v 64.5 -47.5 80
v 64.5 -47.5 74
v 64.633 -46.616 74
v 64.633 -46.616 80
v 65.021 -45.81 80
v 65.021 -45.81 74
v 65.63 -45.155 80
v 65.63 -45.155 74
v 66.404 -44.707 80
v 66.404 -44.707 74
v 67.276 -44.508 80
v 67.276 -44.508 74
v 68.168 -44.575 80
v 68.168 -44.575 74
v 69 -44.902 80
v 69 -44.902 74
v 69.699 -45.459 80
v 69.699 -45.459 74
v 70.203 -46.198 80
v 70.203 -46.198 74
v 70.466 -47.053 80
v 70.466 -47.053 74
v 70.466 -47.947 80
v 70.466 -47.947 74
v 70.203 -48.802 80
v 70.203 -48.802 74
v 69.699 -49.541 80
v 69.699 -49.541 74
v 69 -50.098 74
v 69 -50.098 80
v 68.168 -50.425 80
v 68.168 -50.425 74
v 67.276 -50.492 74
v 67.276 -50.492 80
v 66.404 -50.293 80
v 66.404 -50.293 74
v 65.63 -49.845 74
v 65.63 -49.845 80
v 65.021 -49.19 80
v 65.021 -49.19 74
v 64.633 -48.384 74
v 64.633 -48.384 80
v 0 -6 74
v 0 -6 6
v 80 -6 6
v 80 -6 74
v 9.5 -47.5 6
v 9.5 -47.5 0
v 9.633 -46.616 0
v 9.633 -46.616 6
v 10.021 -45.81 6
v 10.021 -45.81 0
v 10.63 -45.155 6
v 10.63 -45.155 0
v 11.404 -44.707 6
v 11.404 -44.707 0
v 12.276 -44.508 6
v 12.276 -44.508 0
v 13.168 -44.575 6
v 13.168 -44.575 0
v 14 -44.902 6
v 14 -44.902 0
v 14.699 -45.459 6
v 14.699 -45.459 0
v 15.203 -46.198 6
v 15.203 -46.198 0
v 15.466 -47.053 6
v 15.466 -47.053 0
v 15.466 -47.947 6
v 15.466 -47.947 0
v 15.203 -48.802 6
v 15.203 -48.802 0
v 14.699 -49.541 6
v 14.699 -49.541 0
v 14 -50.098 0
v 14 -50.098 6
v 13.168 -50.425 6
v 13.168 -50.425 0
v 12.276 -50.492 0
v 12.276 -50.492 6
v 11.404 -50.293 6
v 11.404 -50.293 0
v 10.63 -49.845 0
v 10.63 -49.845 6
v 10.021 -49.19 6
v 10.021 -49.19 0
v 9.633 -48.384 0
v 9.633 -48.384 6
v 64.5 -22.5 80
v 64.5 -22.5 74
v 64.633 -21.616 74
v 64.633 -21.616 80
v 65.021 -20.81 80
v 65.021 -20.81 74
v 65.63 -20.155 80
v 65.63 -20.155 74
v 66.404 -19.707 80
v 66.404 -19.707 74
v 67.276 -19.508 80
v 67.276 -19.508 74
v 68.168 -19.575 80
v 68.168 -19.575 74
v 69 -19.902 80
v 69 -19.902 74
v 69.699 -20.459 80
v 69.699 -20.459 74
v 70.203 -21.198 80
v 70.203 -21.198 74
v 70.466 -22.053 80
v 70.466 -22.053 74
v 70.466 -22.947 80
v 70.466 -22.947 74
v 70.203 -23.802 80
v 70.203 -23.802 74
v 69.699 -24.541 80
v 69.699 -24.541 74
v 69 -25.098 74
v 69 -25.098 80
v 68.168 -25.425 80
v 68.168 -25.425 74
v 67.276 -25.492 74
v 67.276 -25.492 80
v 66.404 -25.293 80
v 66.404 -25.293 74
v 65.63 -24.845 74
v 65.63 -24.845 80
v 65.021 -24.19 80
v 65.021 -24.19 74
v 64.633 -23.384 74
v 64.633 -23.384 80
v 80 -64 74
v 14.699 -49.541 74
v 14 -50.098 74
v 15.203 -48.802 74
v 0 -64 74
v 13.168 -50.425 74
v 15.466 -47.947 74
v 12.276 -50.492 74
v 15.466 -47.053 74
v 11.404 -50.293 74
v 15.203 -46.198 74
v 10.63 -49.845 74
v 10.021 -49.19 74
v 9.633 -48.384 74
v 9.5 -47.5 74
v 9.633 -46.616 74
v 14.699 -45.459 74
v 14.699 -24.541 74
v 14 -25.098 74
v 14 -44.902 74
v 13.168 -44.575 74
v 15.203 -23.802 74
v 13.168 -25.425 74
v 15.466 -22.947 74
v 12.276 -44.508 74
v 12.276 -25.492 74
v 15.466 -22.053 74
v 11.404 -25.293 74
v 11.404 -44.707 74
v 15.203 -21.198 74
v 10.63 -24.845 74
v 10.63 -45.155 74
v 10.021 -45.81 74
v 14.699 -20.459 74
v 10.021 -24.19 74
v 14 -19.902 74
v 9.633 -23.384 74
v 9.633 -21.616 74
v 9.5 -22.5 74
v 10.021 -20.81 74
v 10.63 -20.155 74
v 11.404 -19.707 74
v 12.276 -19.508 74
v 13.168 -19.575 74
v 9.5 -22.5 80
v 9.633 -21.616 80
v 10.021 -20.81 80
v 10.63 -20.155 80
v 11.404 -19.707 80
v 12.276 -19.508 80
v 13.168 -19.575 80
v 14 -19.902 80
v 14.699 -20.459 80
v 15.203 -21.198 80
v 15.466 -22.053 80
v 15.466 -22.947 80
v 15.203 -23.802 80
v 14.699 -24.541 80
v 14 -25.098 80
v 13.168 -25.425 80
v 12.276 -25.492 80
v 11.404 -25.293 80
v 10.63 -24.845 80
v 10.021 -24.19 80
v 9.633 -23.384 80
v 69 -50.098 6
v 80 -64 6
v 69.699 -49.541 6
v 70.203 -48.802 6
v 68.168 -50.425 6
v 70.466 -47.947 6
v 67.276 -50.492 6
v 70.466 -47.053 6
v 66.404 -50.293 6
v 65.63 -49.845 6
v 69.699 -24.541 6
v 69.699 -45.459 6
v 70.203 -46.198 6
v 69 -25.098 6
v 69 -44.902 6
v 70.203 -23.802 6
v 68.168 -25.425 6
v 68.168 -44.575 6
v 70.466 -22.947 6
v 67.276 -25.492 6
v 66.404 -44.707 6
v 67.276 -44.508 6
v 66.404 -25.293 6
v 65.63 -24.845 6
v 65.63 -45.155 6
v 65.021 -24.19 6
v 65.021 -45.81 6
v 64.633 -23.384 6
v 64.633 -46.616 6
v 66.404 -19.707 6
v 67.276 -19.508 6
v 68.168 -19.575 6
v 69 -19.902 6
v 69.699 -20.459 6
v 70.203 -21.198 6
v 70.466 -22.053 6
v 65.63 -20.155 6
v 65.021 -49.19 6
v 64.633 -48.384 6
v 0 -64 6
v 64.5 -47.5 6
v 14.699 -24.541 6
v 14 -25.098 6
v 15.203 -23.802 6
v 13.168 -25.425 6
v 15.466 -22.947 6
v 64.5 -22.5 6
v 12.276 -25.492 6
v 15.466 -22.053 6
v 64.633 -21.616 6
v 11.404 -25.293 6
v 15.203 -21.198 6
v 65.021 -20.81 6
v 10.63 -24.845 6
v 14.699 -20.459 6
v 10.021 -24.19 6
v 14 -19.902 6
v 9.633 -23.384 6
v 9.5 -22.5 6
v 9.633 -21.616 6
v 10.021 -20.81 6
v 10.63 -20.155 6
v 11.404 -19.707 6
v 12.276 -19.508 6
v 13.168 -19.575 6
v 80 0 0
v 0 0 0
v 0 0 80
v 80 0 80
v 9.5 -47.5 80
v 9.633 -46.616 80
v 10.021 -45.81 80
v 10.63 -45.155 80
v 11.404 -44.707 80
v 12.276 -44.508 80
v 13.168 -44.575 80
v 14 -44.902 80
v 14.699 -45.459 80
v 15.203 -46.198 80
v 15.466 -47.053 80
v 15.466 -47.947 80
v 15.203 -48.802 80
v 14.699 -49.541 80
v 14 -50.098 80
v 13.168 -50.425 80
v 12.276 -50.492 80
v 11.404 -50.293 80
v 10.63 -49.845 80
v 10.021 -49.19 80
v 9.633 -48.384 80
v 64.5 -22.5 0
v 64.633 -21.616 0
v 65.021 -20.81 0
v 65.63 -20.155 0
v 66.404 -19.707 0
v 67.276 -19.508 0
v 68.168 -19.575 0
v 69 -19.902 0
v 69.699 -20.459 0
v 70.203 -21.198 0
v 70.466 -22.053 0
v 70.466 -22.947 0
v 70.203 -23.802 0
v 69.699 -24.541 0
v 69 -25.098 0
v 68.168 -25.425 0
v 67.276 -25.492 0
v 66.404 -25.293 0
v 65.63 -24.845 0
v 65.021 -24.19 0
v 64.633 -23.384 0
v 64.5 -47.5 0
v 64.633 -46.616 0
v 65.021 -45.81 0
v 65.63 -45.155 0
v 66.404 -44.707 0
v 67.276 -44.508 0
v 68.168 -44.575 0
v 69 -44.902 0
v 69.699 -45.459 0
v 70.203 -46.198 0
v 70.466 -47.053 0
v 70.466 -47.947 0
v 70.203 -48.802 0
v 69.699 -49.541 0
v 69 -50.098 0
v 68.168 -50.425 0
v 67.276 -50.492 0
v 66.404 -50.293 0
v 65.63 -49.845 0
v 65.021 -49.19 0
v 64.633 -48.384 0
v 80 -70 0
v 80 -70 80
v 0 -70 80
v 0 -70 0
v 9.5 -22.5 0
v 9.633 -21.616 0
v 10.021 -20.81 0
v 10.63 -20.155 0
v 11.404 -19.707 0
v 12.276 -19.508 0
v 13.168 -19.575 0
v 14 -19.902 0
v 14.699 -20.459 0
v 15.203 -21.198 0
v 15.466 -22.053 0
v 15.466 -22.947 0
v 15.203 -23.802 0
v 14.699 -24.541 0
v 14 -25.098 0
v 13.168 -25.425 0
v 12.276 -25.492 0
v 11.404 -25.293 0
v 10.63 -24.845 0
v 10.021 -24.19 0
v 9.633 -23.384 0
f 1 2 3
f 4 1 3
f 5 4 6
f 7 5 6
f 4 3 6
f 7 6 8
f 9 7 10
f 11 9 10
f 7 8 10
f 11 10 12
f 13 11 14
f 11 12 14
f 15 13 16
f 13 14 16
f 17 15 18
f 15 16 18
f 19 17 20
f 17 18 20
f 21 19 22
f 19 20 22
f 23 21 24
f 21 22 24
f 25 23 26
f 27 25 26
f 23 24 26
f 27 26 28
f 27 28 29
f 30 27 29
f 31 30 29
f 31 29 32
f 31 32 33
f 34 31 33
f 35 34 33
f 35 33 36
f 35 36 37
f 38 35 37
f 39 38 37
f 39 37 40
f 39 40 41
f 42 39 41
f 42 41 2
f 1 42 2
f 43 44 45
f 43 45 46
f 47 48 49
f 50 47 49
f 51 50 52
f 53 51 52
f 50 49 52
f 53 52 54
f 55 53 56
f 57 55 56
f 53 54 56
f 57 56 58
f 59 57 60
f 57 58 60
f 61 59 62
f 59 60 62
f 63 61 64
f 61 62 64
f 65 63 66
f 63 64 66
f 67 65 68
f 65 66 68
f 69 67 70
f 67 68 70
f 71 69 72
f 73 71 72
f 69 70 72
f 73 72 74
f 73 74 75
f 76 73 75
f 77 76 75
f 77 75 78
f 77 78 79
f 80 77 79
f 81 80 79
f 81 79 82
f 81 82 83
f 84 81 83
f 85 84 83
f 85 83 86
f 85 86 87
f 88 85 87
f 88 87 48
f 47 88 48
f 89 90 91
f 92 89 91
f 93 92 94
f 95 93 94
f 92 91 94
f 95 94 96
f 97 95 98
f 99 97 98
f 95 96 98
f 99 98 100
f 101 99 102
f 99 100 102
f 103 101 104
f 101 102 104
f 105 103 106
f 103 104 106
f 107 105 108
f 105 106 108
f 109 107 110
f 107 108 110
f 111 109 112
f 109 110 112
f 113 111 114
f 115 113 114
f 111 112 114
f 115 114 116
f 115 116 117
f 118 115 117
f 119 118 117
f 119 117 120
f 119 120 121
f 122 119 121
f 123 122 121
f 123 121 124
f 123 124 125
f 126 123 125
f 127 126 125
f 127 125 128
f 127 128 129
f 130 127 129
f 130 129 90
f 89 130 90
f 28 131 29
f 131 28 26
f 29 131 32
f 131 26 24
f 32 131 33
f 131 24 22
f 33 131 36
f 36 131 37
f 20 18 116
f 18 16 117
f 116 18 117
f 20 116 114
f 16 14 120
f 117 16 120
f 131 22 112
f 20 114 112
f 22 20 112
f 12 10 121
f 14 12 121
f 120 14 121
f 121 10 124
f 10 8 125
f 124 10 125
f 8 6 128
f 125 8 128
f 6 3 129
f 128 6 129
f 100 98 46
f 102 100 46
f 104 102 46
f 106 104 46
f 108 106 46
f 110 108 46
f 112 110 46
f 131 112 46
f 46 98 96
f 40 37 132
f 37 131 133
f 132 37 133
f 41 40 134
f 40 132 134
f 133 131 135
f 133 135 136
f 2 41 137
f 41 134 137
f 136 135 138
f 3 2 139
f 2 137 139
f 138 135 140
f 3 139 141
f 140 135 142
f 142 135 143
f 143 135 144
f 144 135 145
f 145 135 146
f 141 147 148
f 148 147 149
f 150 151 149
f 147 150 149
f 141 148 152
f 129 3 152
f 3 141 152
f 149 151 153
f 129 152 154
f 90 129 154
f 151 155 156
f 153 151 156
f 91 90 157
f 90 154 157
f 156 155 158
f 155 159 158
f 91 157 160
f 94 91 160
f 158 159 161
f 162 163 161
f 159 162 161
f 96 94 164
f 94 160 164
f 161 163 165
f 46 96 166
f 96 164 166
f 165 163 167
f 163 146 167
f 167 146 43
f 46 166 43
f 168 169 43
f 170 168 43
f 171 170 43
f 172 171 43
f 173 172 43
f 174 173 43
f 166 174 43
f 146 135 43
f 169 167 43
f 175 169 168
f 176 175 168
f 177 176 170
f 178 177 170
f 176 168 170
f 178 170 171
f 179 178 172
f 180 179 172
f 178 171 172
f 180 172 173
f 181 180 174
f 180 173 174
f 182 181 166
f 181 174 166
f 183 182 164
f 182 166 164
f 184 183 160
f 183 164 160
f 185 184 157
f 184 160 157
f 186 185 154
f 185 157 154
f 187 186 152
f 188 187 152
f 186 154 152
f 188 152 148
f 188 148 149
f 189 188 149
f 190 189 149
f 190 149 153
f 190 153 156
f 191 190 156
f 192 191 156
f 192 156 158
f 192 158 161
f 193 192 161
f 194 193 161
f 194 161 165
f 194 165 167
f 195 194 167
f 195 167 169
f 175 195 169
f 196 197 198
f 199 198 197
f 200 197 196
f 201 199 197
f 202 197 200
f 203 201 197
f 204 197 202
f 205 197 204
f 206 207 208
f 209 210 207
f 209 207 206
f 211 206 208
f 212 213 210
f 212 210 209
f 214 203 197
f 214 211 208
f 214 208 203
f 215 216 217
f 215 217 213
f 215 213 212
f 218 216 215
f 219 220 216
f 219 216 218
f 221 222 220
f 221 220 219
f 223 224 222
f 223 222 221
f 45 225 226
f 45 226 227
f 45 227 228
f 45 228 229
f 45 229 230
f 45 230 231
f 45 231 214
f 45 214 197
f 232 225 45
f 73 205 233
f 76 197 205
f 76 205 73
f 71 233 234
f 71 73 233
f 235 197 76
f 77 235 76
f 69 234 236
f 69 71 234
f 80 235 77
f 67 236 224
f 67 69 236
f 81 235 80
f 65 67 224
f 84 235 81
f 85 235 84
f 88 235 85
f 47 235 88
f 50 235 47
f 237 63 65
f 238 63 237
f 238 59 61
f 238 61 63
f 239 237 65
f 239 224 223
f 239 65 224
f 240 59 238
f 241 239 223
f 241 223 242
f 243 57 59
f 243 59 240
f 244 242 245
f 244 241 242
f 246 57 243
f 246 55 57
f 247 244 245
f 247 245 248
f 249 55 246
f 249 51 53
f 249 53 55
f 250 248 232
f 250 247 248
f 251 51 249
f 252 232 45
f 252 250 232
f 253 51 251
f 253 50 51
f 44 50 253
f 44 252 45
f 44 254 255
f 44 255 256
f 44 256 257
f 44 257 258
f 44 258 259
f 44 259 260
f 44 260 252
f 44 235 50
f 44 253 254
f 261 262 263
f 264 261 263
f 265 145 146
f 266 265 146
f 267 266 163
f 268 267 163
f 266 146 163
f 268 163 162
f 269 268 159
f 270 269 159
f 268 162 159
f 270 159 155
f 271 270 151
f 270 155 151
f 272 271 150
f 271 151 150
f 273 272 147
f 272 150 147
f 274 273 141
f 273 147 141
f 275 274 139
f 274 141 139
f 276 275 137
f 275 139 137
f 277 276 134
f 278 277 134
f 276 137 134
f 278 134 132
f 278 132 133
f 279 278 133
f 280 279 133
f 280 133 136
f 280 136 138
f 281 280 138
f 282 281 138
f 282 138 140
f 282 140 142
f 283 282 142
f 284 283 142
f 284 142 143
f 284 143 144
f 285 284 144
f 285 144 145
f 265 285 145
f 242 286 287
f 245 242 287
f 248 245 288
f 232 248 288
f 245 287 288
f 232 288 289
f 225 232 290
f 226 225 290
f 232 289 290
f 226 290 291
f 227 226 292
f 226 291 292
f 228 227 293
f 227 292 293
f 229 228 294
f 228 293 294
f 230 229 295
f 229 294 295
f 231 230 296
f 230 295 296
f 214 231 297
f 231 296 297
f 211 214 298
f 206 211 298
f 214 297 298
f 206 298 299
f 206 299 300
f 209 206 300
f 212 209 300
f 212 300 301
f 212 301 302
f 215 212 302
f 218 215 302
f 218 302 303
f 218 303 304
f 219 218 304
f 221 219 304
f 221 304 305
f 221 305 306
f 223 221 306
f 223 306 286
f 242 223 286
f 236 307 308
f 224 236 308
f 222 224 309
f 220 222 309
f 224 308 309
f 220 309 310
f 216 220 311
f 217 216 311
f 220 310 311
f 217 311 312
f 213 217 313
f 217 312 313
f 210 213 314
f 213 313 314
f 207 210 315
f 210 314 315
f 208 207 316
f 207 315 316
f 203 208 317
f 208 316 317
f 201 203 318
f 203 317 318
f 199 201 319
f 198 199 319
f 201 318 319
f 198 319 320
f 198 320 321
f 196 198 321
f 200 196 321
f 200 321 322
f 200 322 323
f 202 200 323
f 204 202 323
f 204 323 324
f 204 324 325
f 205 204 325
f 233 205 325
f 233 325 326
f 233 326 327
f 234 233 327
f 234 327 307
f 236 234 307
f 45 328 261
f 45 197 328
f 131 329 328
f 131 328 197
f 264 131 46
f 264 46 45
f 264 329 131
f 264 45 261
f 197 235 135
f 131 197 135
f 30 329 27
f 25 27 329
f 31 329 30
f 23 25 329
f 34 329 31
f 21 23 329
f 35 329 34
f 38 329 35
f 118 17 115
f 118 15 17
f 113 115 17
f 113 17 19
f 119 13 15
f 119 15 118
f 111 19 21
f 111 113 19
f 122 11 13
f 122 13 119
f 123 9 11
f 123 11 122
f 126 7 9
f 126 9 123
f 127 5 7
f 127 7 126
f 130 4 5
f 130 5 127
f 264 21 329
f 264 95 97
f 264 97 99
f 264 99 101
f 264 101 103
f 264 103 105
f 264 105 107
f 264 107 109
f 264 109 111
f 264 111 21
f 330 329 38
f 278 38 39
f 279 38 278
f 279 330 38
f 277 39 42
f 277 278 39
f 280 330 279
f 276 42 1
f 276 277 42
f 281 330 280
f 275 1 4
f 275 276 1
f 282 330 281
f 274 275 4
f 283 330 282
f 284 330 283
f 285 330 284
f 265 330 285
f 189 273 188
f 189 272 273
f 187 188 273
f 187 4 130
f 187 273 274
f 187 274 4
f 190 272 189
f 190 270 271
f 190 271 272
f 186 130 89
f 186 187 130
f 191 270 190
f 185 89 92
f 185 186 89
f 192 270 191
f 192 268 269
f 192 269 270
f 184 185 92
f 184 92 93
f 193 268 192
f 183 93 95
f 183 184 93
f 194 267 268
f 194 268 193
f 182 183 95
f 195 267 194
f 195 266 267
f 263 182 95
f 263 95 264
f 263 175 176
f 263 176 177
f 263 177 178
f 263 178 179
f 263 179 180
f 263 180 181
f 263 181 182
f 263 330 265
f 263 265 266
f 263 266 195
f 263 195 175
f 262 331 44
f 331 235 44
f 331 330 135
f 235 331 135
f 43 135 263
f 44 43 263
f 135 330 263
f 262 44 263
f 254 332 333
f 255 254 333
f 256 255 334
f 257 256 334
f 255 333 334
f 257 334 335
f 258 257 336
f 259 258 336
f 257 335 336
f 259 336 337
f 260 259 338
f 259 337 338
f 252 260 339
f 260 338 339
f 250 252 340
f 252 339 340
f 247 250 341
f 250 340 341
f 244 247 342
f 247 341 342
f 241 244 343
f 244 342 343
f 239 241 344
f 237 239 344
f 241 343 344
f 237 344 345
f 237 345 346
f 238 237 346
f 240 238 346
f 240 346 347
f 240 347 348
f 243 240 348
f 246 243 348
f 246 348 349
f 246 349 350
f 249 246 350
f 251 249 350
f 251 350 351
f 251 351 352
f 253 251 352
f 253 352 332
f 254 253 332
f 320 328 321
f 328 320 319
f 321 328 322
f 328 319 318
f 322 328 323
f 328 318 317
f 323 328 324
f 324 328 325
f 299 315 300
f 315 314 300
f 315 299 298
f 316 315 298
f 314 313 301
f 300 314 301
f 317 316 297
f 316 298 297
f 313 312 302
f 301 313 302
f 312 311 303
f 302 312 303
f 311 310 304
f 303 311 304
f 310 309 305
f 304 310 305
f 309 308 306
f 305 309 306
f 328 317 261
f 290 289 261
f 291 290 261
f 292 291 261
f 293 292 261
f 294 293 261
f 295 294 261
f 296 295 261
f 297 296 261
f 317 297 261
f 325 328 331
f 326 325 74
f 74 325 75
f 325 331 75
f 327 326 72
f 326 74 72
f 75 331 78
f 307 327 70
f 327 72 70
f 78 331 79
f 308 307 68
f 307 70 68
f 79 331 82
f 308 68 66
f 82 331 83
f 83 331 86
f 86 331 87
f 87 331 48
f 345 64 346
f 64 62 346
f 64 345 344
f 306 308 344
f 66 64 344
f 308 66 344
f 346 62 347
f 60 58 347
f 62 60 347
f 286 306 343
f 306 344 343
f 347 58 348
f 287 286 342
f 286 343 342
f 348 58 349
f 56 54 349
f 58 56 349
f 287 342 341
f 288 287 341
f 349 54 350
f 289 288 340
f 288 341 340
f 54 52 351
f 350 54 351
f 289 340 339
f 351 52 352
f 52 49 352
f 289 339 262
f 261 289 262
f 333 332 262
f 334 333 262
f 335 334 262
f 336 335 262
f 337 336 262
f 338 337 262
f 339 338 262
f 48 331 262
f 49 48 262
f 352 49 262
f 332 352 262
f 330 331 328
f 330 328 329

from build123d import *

# Parameters (mm, degrees)
F0_W     = 70
F0_H     = 80
F0_W_2   = 58
F0_H_2   = 68
F1_DEPTH = 80
F3_D     = 6


with BuildPart() as f1:
    # F0 (on Right) → F1 (new body)
    with BuildSketch(Plane.YZ):
        with Locations((-35, 40)):
            Rectangle(F0_W, F0_H)
        with Locations((-35, 40)):
            Rectangle(F0_W_2, F0_H_2, mode=Mode.SUBTRACT)
    extrude(amount=F1_DEPTH)

    # F3 (through all)
    with Locations(Plane.XY.offset(80)):
        with Locations((12.5, -22.5), (67.5, -22.5), (67.5, -47.5), (12.5, -47.5)):
            Hole(F3_D / 2)


solid = f1.part
